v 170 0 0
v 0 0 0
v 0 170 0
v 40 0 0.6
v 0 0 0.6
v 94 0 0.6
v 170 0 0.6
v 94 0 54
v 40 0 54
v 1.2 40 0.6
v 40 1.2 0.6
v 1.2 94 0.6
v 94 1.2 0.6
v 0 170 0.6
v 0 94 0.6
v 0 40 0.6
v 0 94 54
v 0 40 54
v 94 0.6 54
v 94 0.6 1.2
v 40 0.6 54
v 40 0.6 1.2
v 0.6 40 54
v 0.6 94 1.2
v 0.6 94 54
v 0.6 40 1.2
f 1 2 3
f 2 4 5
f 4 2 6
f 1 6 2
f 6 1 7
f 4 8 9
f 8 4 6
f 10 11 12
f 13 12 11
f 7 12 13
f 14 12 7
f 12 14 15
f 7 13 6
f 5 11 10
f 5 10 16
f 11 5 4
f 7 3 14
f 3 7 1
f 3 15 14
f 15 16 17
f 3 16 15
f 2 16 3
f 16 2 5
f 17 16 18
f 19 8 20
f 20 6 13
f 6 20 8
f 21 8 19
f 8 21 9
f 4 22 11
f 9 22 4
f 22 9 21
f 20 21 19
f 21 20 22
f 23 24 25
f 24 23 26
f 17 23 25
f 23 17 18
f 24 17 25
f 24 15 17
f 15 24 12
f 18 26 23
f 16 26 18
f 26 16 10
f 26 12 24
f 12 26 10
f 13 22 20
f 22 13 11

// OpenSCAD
//Seite Dreieck
s=170;
//Klebeband
k=25+2;
//Thickness
t=0.6;
//kt
kt=40;

module halter()
{
linear_extrude(t)
polygon([[0,0],[s,0],[0,s]]);

translate([kt,0,0])
cube([k*2,t,k*2]);

translate([0,kt,0])
cube([t,k*2,k*2]);
}

module verbinder()
{
color("green")
linear_extrude(k*2)
polygon([[0,0],[t,0],[0,t]]);
}

halter();

translate([t,kt,t])
rotate([270,270,0])
verbinder();

rotate([90,0,0])
translate([kt,t,0-t])
rotate([0,90,0])
verbinder();
